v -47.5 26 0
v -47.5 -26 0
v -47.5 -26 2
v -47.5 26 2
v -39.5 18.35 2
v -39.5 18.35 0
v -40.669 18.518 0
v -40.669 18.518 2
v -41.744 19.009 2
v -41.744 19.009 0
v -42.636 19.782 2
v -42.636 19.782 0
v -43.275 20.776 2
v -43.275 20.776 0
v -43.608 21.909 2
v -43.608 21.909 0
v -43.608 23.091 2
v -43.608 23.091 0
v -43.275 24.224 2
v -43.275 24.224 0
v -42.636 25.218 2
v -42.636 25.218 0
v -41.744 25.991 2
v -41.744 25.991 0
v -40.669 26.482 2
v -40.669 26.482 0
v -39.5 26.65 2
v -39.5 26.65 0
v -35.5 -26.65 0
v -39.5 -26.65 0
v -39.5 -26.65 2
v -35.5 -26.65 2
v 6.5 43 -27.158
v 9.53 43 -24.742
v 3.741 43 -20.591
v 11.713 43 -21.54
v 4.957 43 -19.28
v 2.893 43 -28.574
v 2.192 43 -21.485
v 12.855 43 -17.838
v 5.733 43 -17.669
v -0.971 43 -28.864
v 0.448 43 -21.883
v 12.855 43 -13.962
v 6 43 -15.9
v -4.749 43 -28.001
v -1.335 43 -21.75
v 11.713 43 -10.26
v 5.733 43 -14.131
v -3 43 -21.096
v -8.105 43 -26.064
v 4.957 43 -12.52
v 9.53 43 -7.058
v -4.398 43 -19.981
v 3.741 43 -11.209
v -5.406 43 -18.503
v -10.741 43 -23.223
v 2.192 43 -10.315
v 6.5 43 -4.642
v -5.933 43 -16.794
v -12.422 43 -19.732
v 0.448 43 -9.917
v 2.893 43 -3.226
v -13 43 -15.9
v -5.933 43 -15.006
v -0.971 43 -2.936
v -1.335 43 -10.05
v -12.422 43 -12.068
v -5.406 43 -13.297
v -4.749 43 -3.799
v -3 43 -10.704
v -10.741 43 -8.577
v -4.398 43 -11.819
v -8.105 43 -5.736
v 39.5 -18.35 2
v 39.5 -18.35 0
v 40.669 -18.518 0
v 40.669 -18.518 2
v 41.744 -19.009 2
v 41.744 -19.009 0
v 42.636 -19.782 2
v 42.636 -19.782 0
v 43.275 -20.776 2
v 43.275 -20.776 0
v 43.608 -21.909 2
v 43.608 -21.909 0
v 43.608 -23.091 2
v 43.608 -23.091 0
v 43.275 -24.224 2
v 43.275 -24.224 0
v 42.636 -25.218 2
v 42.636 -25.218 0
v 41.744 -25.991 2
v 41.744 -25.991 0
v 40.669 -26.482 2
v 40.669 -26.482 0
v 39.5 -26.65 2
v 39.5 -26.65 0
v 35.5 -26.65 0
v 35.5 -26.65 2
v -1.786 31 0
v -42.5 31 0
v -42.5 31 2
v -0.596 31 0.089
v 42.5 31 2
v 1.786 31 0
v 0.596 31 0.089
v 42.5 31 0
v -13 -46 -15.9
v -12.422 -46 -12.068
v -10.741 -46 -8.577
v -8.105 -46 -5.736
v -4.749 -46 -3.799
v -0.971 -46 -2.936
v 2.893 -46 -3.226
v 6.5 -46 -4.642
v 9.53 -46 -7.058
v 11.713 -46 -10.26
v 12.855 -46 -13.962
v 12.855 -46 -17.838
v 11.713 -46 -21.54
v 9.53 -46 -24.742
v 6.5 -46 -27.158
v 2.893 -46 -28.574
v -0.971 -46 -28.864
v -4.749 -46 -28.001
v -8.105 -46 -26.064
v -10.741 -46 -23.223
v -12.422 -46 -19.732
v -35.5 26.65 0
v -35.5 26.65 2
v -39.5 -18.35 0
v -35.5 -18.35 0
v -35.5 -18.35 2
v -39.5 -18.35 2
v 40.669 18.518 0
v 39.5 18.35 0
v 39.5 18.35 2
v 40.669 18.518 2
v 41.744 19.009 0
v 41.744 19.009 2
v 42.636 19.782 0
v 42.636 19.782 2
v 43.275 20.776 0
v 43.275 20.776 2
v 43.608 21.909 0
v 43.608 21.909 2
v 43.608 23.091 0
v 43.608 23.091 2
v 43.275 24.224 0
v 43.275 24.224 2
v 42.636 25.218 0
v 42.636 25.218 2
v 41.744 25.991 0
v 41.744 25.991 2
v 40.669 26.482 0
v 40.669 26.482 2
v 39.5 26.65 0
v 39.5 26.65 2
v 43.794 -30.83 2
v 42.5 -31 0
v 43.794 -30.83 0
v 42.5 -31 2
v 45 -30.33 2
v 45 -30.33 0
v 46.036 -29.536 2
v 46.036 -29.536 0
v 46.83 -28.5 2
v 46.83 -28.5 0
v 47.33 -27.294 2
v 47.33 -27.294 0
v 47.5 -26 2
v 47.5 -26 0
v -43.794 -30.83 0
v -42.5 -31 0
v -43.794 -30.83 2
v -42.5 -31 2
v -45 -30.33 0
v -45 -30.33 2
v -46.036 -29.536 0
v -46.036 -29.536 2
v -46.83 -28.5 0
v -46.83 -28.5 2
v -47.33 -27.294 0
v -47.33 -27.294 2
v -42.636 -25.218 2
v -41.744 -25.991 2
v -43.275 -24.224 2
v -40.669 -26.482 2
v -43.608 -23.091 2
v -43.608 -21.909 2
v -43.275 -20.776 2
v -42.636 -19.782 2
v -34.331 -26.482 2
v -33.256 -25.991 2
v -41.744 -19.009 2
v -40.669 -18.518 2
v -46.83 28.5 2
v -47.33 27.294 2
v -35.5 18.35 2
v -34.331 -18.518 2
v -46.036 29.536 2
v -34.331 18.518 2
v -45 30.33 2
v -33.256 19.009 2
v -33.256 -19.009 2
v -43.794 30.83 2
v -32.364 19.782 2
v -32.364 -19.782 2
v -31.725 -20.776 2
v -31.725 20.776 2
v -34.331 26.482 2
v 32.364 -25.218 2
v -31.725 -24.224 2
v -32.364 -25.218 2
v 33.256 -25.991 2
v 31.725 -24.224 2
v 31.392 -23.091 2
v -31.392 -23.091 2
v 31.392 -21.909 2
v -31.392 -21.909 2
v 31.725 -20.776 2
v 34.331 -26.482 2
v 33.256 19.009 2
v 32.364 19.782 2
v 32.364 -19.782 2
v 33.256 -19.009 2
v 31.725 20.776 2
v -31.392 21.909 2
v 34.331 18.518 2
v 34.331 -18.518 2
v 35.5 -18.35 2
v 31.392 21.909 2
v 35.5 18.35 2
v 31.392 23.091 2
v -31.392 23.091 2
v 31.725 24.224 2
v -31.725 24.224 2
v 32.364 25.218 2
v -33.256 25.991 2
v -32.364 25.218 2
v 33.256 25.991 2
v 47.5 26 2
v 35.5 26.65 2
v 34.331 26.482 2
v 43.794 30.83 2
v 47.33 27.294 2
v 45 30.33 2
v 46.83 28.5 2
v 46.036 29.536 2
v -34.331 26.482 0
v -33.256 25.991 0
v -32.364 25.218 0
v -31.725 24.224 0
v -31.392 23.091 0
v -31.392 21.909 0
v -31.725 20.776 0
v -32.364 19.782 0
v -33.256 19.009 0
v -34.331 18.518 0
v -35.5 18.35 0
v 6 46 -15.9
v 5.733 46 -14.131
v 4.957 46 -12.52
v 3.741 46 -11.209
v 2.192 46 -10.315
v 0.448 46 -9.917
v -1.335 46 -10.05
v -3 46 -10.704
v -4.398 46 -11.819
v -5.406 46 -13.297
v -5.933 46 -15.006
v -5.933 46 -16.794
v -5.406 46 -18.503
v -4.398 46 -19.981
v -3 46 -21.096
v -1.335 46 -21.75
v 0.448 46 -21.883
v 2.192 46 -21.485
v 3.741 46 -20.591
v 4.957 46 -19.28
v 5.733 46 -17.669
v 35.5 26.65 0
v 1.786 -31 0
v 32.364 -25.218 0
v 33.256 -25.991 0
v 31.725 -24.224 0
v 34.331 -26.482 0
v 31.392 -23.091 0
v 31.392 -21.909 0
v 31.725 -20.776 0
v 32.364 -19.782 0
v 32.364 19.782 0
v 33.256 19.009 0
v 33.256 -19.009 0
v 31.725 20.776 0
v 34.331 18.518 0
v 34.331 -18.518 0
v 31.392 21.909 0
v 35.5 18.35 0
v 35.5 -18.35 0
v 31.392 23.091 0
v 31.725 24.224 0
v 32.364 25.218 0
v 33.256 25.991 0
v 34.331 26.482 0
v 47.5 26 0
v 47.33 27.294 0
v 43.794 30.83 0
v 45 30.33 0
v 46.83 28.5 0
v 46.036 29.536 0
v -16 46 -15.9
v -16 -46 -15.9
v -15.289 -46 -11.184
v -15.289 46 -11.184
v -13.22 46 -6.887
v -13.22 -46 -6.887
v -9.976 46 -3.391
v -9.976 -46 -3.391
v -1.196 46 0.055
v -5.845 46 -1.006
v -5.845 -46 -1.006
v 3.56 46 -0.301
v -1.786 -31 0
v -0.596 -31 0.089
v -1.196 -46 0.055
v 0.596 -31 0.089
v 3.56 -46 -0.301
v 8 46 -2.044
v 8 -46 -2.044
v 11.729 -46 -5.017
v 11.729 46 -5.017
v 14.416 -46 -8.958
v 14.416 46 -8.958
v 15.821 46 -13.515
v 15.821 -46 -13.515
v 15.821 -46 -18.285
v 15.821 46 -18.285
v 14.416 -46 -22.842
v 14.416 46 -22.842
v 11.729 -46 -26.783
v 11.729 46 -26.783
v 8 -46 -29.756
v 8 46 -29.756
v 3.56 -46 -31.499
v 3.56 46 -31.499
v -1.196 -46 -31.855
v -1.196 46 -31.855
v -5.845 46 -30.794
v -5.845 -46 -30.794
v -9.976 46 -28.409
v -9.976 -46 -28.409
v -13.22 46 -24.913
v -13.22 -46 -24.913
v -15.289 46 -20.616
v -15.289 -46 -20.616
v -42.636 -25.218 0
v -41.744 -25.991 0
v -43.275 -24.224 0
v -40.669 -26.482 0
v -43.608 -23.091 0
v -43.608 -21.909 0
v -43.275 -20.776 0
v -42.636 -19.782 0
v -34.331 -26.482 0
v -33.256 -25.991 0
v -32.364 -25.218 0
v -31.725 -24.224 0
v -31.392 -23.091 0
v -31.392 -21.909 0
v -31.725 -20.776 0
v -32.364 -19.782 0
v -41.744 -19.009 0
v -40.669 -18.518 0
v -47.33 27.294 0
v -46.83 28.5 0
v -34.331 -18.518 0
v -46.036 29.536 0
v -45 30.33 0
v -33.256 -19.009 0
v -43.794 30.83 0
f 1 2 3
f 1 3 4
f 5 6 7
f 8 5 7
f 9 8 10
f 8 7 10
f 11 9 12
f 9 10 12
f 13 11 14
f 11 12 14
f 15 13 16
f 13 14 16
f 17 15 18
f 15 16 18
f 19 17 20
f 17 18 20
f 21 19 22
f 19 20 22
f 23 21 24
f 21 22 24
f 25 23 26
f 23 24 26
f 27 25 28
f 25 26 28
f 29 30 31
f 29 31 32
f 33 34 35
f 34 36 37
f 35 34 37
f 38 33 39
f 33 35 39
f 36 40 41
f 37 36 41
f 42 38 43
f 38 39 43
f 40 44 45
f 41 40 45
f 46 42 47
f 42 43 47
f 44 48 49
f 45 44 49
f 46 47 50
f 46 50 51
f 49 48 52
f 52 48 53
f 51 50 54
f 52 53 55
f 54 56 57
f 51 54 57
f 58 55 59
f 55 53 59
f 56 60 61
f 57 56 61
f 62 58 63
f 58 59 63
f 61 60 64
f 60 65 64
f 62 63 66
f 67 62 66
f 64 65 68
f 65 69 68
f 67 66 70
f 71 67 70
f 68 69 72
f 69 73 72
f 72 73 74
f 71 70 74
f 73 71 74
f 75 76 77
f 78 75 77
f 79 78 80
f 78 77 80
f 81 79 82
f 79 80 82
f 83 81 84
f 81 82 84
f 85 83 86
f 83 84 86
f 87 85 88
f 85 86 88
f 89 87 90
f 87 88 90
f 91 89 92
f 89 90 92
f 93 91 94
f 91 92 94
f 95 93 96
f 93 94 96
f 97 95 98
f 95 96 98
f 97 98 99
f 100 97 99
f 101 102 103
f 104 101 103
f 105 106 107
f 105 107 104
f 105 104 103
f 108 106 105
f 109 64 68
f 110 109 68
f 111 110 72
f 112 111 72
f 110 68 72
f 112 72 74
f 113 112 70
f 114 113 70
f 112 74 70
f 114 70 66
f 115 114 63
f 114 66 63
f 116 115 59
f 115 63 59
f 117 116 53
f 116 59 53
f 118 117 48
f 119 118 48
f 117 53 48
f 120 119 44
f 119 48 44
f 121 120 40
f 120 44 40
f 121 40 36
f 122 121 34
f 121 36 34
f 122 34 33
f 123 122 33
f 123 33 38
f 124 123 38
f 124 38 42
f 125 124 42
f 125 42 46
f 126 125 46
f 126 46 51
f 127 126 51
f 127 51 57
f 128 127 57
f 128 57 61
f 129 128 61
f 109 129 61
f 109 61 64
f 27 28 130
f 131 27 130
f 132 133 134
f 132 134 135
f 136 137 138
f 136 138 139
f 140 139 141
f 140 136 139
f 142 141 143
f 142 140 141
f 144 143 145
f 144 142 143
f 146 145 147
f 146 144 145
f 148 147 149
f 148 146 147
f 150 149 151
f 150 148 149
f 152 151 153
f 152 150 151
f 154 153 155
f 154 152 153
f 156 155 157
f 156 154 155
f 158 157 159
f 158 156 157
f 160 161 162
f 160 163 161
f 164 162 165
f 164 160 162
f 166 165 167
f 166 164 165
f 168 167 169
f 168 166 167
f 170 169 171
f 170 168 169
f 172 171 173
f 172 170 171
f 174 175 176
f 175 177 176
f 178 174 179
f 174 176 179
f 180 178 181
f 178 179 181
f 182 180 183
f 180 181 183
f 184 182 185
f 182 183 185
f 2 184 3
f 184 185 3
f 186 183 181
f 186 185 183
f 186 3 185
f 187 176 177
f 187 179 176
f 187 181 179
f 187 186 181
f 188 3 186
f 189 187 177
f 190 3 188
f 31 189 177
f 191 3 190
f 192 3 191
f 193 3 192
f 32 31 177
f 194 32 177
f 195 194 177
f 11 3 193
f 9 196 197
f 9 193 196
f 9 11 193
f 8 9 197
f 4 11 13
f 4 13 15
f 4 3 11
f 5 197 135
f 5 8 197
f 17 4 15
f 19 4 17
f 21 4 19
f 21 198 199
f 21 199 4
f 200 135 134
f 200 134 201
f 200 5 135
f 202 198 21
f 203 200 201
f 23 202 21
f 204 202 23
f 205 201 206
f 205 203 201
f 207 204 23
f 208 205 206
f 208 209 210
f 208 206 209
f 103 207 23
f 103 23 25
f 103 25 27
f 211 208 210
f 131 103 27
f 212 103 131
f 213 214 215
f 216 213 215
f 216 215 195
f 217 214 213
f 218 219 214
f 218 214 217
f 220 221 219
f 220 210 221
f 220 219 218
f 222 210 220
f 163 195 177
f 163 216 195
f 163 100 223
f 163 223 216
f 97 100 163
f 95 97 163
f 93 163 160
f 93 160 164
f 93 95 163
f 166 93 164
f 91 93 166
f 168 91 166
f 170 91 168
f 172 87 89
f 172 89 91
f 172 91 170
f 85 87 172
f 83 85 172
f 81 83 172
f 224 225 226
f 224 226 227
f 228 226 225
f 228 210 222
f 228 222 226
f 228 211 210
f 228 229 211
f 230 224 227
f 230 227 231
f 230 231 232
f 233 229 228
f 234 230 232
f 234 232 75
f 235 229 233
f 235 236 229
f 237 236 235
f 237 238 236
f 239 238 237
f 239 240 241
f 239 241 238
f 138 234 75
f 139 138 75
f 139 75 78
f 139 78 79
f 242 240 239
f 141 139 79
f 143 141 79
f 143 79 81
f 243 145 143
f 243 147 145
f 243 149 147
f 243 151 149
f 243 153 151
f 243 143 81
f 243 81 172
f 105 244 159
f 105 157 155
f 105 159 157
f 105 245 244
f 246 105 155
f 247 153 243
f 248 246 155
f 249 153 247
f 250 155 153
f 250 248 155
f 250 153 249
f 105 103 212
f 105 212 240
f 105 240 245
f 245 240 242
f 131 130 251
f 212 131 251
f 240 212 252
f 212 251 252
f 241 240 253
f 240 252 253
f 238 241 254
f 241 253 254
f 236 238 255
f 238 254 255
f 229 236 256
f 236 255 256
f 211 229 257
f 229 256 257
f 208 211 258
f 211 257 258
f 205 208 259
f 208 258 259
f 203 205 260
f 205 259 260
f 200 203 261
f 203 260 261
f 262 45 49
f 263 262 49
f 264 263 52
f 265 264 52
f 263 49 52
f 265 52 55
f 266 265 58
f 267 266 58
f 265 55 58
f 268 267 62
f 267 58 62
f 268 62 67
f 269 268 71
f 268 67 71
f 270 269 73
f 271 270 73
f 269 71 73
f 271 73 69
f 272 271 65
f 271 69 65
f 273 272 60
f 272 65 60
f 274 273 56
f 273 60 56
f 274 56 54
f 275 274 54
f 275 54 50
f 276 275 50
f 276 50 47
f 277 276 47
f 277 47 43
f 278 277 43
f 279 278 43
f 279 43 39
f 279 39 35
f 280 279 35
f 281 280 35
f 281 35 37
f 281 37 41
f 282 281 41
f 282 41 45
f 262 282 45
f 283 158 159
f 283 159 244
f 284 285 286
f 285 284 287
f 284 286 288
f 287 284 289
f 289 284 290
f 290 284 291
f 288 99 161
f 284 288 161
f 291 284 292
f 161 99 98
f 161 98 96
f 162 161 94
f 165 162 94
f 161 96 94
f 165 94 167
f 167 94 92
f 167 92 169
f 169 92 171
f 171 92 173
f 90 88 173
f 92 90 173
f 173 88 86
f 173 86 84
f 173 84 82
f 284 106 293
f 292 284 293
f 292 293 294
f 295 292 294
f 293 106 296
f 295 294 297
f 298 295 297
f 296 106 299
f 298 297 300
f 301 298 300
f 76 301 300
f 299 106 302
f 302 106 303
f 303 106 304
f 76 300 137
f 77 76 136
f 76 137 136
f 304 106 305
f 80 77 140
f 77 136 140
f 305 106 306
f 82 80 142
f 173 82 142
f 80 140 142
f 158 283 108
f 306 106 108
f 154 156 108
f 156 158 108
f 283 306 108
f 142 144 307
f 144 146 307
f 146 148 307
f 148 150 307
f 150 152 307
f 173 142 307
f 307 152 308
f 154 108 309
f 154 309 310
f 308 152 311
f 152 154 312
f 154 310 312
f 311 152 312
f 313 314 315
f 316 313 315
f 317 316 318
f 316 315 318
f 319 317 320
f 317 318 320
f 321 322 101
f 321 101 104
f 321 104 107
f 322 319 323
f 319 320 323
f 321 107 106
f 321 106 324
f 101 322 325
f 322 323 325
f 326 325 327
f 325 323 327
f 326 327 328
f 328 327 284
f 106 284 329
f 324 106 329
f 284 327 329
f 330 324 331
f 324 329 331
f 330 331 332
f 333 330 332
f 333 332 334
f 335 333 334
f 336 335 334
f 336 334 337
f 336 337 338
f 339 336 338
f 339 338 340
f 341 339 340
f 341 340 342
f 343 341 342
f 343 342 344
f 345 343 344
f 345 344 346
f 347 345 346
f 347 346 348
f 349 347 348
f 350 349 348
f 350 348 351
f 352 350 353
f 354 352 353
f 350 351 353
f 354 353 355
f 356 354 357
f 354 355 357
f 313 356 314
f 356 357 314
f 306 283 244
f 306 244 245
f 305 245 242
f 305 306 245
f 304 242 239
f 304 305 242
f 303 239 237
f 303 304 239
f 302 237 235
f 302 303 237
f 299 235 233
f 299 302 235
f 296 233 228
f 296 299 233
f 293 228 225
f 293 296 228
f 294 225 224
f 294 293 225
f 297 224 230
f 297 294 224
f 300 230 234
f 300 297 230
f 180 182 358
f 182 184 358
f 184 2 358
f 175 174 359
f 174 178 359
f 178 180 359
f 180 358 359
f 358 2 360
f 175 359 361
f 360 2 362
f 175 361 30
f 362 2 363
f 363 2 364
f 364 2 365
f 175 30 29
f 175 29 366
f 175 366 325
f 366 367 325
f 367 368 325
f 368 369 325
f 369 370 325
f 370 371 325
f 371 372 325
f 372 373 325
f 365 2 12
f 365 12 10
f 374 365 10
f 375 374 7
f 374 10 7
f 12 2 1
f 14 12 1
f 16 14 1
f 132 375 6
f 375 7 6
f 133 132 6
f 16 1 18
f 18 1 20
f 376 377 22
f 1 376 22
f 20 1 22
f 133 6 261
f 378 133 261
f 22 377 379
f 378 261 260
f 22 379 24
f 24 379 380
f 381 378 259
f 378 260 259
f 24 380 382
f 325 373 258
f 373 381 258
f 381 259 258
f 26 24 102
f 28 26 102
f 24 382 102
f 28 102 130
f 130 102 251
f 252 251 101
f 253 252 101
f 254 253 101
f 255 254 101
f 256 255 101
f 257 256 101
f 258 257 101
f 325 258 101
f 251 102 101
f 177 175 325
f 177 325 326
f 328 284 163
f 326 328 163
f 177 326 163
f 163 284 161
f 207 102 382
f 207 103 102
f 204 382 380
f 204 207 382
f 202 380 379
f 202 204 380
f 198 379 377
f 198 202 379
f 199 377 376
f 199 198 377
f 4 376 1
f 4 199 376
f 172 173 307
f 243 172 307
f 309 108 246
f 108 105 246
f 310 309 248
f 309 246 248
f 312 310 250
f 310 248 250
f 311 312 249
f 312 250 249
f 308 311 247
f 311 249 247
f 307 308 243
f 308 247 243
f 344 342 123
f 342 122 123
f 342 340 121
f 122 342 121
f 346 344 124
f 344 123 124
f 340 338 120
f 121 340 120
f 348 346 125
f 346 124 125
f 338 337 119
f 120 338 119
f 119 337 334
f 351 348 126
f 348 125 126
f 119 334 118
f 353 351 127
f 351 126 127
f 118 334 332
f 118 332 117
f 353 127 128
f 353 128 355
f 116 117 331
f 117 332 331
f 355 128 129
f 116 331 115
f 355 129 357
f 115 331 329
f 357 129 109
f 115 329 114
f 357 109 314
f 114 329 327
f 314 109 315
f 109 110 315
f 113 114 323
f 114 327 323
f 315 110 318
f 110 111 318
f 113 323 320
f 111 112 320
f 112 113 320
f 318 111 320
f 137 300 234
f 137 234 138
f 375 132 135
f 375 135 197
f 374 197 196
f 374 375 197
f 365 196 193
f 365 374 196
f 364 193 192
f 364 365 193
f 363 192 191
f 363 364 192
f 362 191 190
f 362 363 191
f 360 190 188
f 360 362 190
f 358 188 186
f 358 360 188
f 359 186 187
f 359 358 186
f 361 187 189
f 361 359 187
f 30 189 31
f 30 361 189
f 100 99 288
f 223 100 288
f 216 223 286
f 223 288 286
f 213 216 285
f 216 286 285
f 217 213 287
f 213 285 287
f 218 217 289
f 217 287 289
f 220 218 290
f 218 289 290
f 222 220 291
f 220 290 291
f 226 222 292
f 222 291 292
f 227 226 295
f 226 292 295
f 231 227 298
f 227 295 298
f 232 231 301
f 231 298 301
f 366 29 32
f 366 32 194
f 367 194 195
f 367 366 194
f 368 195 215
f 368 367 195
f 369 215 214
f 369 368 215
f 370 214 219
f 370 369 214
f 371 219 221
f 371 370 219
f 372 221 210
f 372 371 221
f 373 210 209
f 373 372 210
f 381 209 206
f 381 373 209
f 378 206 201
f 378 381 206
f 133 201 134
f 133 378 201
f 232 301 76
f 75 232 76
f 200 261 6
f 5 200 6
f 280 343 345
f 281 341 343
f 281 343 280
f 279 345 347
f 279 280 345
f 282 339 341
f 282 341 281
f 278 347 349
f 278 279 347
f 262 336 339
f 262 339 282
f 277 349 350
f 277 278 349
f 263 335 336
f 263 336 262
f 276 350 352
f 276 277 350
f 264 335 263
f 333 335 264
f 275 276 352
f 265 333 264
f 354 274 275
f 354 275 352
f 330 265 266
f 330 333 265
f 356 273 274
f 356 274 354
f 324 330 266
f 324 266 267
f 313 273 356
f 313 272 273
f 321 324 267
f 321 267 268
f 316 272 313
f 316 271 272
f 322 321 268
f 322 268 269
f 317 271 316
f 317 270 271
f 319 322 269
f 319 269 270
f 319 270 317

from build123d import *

# Parameters (mm, degrees)
SKETCH_1_W           = 95
SKETCH_1_H           = 62
EXTRUDE_1_DEPTH      = 2
EXTRUDE_2_DEPTH      = 15
EXTRUDE_2_DEPTH_BACK = 77
SKETCH_2_R           = 16
FILLET_1_R           = 5
CUT_EXTRUDE_START    = -3
SKETCH_3_R           = 13
CUT_EXTRUDE_3_DEPTH  = 106.341404828
SKETCH_5_R           = 6
CUT_EXTRUDE_4_DEPTH  = 106.805765438


with BuildPart() as part:
    # 草图1 → 凸台-拉伸1 (new body)
    with BuildSketch(Plane.XY):
        Rectangle(SKETCH_1_W, SKETCH_1_H)
        with BuildLine():
            Line((-39.5, 26.65), (-35.5, 26.65))
            ThreePointArc((-35.5, 26.65), (-31.35, 22.5), (-35.5, 18.35))
            Line((-35.5, 18.35), (-39.5, 18.35))
            ThreePointArc((-39.5, 18.35), (-43.65, 22.5), (-39.5, 26.65))
        make_face(mode=Mode.SUBTRACT)
        with BuildLine():
            Line((39.5, 26.65), (35.5, 26.65))
            ThreePointArc((35.5, 26.65), (31.35, 22.5), (35.5, 18.35))
            Line((35.5, 18.35), (39.5, 18.35))
            ThreePointArc((39.5, 18.35), (43.65, 22.5), (39.5, 26.65))
        make_face(mode=Mode.SUBTRACT)
        with BuildLine():
            Line((-39.5, -26.65), (-35.5, -26.65))
            ThreePointArc((-35.5, -26.65), (-31.35, -22.5), (-35.5, -18.35))
            Line((-35.5, -18.35), (-39.5, -18.35))
            ThreePointArc((-39.5, -18.35), (-43.65, -22.5), (-39.5, -26.65))
        make_face(mode=Mode.SUBTRACT)
        with BuildLine():
            Line((39.5, -26.65), (35.5, -26.65))
            ThreePointArc((35.5, -26.65), (31.35, -22.5), (35.5, -18.35))
            Line((35.5, -18.35), (39.5, -18.35))
            ThreePointArc((39.5, -18.35), (43.65, -22.5), (39.5, -26.65))
        make_face(mode=Mode.SUBTRACT)
    extrude(amount=EXTRUDE_1_DEPTH)

    # 草图2 → 凸台-拉伸2 (add, two sides: drawn at the far end of the back side and taken through both)
    with BuildSketch(Plane(origin=(0, 31, 0), x_dir=(1, 0, 0), z_dir=(0, 1, 0)).offset(-EXTRUDE_2_DEPTH_BACK)):
        with Locations(Location((0, 15.9, 0), (0, 0, 180))):
            Circle(SKETCH_2_R)
    extrude(amount=EXTRUDE_2_DEPTH + EXTRUDE_2_DEPTH_BACK)

    # 圆角1
    fillet_1_edges = [part.edges().sort_by_distance(p)[0] for p in [
        (-47.5, 31, 1),
        (47.5, 31, 1),
        (47.5, -31, 1),
        (-47.5, -31, 1),
    ]]
    fillet(fillet_1_edges, radius=FILLET_1_R)

    # 草图3 → 切除-拉伸3 (cut, through all)
    with BuildSketch(Plane(origin=(0, 46, 0), x_dir=(1, 0, 0), z_dir=(0, 1, 0)).offset(CUT_EXTRUDE_START)):
        with Locations(Location((0, 15.9, 0), (0, 0, 180))):
            Circle(SKETCH_3_R)
    extrude(amount=-CUT_EXTRUDE_3_DEPTH, mode=Mode.SUBTRACT)

    # 草图5 → 切除-拉伸4 (cut, through all)
    with BuildSketch(Plane(origin=(0, 43, 0), x_dir=(-1, 0, 0), z_dir=(0, -1, 0))):
        with Locations(Location((0, 15.9, 0), (0, 0, 180))):
            Circle(SKETCH_5_R)
    extrude(amount=-CUT_EXTRUDE_4_DEPTH, mode=Mode.SUBTRACT)


solid = part.part
